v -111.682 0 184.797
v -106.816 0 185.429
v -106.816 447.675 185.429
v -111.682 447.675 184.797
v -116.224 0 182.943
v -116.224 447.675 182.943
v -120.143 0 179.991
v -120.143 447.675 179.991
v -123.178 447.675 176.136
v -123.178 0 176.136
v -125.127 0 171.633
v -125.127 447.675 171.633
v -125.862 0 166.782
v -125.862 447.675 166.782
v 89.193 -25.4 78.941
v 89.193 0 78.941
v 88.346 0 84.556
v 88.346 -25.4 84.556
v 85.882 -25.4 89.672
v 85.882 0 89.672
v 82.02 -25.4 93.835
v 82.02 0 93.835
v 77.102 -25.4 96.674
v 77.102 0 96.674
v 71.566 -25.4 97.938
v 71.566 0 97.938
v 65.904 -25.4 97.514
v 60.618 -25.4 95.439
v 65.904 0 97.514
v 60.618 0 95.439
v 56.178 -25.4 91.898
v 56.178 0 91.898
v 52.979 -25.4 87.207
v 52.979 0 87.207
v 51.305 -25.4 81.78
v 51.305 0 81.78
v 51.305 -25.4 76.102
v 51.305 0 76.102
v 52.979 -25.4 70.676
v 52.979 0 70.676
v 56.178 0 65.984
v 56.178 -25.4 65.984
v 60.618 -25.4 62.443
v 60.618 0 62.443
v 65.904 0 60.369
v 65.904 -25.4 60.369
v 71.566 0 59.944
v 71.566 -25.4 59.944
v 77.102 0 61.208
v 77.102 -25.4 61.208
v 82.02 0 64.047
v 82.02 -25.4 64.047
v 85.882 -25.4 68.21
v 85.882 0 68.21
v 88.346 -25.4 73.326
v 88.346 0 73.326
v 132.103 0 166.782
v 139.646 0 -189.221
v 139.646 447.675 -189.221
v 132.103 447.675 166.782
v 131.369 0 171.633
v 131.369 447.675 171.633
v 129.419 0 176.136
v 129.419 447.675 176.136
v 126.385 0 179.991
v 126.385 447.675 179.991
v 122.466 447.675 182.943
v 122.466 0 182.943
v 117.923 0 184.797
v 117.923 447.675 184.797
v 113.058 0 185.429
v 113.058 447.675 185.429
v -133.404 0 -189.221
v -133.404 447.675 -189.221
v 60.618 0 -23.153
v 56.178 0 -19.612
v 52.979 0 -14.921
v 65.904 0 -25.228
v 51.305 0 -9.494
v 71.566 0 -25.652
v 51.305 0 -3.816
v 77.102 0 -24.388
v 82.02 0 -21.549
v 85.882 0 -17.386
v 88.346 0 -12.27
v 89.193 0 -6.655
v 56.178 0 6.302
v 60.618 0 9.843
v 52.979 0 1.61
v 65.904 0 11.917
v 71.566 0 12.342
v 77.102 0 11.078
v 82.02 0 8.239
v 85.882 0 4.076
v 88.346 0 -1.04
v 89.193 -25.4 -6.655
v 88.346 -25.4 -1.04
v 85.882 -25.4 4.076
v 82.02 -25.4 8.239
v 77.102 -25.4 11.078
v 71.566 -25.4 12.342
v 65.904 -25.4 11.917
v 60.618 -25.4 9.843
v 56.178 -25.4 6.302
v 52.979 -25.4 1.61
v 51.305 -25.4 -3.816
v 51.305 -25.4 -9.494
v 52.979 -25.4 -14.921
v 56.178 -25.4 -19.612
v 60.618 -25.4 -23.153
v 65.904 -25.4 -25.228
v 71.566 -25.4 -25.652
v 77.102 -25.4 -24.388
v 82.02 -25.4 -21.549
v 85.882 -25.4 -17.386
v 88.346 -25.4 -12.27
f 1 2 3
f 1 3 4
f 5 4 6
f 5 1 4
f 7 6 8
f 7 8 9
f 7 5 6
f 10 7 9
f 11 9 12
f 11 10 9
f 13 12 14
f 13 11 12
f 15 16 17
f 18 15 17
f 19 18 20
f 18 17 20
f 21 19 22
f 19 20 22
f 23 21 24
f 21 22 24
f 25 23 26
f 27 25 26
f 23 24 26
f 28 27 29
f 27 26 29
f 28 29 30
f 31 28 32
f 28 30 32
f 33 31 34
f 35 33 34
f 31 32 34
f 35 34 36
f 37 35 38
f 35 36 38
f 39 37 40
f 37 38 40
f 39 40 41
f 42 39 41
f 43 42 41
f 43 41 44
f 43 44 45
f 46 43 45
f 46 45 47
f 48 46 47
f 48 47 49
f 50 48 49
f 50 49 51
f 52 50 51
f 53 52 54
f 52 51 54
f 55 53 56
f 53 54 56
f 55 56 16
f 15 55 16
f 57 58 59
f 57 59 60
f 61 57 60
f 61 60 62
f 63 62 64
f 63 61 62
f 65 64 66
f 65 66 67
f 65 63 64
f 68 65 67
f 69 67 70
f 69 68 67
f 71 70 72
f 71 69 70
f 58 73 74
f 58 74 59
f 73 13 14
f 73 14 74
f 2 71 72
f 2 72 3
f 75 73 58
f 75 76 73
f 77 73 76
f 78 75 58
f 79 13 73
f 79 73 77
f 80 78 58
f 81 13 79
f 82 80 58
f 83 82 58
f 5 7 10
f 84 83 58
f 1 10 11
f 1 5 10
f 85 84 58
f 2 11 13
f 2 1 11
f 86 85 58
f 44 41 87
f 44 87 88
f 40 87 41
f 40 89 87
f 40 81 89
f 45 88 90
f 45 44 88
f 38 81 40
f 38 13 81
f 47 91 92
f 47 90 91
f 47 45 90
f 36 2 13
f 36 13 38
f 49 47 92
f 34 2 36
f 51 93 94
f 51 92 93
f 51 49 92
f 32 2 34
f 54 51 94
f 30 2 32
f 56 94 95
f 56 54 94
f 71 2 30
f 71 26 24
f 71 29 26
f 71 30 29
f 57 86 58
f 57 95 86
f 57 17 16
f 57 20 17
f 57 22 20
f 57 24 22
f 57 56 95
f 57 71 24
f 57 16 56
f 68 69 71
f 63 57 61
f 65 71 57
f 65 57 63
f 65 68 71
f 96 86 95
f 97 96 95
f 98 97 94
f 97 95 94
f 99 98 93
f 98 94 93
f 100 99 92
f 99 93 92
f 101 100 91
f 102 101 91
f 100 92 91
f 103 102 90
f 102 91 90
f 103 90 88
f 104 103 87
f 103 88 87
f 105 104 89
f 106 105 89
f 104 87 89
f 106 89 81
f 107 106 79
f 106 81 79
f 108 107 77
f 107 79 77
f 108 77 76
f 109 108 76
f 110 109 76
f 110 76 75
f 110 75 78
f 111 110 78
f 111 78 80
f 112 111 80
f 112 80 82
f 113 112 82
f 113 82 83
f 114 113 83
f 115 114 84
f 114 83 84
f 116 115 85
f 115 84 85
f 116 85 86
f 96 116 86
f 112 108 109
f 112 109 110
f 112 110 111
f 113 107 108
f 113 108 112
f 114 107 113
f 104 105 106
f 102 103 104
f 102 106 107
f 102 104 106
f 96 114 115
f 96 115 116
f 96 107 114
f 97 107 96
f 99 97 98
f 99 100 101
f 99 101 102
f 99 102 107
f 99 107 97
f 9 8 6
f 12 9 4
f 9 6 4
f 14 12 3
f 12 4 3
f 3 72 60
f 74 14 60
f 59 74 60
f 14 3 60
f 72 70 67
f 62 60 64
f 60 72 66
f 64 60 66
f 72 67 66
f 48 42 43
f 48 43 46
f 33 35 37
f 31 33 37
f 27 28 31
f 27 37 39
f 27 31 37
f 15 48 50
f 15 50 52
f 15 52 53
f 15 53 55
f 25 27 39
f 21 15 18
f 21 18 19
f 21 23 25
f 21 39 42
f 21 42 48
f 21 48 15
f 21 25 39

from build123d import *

# Parameters (mm, degrees)
F1_DEPTH = 447.675
F2_R     = 19.05
F3_DEPTH = 25.4


with BuildPart() as f1:
    # F0 (on Front) → F1 (new body)
    with BuildSketch(Plane.XZ):
        with BuildLine():
            Line((113.057586, 185.428598), (3.12076, 185.428598))
            Line((3.12076, 185.428598), (-106.816067, 185.428598))
            ThreePointArc((-106.816067, 185.428598), (-120.143025, 179.990897), (-125.861793, 166.782109))
            Line((-125.861793, 166.782109), (-133.40424, -189.221402))
            Line((-133.40424, -189.221402), (3.12076, -189.221402))
            Line((3.12076, -189.221402), (139.64576, -189.221402))
            Line((139.64576, -189.221402), (132.103312, 166.782109))
            ThreePointArc((132.103312, 166.782109), (126.384544, 179.990897), (113.057586, 185.428598))
        make_face()
    extrude(amount=-F1_DEPTH)

    # F2 (on face) → F3 (join)
    with BuildSketch(Plane.XZ):
        with Locations((70.142567, 78.941181)):
            Circle(F2_R)
        with Locations((70.142567, -6.655197)):
            Circle(F2_R)
    extrude(amount=F3_DEPTH)


solid = f1.part
